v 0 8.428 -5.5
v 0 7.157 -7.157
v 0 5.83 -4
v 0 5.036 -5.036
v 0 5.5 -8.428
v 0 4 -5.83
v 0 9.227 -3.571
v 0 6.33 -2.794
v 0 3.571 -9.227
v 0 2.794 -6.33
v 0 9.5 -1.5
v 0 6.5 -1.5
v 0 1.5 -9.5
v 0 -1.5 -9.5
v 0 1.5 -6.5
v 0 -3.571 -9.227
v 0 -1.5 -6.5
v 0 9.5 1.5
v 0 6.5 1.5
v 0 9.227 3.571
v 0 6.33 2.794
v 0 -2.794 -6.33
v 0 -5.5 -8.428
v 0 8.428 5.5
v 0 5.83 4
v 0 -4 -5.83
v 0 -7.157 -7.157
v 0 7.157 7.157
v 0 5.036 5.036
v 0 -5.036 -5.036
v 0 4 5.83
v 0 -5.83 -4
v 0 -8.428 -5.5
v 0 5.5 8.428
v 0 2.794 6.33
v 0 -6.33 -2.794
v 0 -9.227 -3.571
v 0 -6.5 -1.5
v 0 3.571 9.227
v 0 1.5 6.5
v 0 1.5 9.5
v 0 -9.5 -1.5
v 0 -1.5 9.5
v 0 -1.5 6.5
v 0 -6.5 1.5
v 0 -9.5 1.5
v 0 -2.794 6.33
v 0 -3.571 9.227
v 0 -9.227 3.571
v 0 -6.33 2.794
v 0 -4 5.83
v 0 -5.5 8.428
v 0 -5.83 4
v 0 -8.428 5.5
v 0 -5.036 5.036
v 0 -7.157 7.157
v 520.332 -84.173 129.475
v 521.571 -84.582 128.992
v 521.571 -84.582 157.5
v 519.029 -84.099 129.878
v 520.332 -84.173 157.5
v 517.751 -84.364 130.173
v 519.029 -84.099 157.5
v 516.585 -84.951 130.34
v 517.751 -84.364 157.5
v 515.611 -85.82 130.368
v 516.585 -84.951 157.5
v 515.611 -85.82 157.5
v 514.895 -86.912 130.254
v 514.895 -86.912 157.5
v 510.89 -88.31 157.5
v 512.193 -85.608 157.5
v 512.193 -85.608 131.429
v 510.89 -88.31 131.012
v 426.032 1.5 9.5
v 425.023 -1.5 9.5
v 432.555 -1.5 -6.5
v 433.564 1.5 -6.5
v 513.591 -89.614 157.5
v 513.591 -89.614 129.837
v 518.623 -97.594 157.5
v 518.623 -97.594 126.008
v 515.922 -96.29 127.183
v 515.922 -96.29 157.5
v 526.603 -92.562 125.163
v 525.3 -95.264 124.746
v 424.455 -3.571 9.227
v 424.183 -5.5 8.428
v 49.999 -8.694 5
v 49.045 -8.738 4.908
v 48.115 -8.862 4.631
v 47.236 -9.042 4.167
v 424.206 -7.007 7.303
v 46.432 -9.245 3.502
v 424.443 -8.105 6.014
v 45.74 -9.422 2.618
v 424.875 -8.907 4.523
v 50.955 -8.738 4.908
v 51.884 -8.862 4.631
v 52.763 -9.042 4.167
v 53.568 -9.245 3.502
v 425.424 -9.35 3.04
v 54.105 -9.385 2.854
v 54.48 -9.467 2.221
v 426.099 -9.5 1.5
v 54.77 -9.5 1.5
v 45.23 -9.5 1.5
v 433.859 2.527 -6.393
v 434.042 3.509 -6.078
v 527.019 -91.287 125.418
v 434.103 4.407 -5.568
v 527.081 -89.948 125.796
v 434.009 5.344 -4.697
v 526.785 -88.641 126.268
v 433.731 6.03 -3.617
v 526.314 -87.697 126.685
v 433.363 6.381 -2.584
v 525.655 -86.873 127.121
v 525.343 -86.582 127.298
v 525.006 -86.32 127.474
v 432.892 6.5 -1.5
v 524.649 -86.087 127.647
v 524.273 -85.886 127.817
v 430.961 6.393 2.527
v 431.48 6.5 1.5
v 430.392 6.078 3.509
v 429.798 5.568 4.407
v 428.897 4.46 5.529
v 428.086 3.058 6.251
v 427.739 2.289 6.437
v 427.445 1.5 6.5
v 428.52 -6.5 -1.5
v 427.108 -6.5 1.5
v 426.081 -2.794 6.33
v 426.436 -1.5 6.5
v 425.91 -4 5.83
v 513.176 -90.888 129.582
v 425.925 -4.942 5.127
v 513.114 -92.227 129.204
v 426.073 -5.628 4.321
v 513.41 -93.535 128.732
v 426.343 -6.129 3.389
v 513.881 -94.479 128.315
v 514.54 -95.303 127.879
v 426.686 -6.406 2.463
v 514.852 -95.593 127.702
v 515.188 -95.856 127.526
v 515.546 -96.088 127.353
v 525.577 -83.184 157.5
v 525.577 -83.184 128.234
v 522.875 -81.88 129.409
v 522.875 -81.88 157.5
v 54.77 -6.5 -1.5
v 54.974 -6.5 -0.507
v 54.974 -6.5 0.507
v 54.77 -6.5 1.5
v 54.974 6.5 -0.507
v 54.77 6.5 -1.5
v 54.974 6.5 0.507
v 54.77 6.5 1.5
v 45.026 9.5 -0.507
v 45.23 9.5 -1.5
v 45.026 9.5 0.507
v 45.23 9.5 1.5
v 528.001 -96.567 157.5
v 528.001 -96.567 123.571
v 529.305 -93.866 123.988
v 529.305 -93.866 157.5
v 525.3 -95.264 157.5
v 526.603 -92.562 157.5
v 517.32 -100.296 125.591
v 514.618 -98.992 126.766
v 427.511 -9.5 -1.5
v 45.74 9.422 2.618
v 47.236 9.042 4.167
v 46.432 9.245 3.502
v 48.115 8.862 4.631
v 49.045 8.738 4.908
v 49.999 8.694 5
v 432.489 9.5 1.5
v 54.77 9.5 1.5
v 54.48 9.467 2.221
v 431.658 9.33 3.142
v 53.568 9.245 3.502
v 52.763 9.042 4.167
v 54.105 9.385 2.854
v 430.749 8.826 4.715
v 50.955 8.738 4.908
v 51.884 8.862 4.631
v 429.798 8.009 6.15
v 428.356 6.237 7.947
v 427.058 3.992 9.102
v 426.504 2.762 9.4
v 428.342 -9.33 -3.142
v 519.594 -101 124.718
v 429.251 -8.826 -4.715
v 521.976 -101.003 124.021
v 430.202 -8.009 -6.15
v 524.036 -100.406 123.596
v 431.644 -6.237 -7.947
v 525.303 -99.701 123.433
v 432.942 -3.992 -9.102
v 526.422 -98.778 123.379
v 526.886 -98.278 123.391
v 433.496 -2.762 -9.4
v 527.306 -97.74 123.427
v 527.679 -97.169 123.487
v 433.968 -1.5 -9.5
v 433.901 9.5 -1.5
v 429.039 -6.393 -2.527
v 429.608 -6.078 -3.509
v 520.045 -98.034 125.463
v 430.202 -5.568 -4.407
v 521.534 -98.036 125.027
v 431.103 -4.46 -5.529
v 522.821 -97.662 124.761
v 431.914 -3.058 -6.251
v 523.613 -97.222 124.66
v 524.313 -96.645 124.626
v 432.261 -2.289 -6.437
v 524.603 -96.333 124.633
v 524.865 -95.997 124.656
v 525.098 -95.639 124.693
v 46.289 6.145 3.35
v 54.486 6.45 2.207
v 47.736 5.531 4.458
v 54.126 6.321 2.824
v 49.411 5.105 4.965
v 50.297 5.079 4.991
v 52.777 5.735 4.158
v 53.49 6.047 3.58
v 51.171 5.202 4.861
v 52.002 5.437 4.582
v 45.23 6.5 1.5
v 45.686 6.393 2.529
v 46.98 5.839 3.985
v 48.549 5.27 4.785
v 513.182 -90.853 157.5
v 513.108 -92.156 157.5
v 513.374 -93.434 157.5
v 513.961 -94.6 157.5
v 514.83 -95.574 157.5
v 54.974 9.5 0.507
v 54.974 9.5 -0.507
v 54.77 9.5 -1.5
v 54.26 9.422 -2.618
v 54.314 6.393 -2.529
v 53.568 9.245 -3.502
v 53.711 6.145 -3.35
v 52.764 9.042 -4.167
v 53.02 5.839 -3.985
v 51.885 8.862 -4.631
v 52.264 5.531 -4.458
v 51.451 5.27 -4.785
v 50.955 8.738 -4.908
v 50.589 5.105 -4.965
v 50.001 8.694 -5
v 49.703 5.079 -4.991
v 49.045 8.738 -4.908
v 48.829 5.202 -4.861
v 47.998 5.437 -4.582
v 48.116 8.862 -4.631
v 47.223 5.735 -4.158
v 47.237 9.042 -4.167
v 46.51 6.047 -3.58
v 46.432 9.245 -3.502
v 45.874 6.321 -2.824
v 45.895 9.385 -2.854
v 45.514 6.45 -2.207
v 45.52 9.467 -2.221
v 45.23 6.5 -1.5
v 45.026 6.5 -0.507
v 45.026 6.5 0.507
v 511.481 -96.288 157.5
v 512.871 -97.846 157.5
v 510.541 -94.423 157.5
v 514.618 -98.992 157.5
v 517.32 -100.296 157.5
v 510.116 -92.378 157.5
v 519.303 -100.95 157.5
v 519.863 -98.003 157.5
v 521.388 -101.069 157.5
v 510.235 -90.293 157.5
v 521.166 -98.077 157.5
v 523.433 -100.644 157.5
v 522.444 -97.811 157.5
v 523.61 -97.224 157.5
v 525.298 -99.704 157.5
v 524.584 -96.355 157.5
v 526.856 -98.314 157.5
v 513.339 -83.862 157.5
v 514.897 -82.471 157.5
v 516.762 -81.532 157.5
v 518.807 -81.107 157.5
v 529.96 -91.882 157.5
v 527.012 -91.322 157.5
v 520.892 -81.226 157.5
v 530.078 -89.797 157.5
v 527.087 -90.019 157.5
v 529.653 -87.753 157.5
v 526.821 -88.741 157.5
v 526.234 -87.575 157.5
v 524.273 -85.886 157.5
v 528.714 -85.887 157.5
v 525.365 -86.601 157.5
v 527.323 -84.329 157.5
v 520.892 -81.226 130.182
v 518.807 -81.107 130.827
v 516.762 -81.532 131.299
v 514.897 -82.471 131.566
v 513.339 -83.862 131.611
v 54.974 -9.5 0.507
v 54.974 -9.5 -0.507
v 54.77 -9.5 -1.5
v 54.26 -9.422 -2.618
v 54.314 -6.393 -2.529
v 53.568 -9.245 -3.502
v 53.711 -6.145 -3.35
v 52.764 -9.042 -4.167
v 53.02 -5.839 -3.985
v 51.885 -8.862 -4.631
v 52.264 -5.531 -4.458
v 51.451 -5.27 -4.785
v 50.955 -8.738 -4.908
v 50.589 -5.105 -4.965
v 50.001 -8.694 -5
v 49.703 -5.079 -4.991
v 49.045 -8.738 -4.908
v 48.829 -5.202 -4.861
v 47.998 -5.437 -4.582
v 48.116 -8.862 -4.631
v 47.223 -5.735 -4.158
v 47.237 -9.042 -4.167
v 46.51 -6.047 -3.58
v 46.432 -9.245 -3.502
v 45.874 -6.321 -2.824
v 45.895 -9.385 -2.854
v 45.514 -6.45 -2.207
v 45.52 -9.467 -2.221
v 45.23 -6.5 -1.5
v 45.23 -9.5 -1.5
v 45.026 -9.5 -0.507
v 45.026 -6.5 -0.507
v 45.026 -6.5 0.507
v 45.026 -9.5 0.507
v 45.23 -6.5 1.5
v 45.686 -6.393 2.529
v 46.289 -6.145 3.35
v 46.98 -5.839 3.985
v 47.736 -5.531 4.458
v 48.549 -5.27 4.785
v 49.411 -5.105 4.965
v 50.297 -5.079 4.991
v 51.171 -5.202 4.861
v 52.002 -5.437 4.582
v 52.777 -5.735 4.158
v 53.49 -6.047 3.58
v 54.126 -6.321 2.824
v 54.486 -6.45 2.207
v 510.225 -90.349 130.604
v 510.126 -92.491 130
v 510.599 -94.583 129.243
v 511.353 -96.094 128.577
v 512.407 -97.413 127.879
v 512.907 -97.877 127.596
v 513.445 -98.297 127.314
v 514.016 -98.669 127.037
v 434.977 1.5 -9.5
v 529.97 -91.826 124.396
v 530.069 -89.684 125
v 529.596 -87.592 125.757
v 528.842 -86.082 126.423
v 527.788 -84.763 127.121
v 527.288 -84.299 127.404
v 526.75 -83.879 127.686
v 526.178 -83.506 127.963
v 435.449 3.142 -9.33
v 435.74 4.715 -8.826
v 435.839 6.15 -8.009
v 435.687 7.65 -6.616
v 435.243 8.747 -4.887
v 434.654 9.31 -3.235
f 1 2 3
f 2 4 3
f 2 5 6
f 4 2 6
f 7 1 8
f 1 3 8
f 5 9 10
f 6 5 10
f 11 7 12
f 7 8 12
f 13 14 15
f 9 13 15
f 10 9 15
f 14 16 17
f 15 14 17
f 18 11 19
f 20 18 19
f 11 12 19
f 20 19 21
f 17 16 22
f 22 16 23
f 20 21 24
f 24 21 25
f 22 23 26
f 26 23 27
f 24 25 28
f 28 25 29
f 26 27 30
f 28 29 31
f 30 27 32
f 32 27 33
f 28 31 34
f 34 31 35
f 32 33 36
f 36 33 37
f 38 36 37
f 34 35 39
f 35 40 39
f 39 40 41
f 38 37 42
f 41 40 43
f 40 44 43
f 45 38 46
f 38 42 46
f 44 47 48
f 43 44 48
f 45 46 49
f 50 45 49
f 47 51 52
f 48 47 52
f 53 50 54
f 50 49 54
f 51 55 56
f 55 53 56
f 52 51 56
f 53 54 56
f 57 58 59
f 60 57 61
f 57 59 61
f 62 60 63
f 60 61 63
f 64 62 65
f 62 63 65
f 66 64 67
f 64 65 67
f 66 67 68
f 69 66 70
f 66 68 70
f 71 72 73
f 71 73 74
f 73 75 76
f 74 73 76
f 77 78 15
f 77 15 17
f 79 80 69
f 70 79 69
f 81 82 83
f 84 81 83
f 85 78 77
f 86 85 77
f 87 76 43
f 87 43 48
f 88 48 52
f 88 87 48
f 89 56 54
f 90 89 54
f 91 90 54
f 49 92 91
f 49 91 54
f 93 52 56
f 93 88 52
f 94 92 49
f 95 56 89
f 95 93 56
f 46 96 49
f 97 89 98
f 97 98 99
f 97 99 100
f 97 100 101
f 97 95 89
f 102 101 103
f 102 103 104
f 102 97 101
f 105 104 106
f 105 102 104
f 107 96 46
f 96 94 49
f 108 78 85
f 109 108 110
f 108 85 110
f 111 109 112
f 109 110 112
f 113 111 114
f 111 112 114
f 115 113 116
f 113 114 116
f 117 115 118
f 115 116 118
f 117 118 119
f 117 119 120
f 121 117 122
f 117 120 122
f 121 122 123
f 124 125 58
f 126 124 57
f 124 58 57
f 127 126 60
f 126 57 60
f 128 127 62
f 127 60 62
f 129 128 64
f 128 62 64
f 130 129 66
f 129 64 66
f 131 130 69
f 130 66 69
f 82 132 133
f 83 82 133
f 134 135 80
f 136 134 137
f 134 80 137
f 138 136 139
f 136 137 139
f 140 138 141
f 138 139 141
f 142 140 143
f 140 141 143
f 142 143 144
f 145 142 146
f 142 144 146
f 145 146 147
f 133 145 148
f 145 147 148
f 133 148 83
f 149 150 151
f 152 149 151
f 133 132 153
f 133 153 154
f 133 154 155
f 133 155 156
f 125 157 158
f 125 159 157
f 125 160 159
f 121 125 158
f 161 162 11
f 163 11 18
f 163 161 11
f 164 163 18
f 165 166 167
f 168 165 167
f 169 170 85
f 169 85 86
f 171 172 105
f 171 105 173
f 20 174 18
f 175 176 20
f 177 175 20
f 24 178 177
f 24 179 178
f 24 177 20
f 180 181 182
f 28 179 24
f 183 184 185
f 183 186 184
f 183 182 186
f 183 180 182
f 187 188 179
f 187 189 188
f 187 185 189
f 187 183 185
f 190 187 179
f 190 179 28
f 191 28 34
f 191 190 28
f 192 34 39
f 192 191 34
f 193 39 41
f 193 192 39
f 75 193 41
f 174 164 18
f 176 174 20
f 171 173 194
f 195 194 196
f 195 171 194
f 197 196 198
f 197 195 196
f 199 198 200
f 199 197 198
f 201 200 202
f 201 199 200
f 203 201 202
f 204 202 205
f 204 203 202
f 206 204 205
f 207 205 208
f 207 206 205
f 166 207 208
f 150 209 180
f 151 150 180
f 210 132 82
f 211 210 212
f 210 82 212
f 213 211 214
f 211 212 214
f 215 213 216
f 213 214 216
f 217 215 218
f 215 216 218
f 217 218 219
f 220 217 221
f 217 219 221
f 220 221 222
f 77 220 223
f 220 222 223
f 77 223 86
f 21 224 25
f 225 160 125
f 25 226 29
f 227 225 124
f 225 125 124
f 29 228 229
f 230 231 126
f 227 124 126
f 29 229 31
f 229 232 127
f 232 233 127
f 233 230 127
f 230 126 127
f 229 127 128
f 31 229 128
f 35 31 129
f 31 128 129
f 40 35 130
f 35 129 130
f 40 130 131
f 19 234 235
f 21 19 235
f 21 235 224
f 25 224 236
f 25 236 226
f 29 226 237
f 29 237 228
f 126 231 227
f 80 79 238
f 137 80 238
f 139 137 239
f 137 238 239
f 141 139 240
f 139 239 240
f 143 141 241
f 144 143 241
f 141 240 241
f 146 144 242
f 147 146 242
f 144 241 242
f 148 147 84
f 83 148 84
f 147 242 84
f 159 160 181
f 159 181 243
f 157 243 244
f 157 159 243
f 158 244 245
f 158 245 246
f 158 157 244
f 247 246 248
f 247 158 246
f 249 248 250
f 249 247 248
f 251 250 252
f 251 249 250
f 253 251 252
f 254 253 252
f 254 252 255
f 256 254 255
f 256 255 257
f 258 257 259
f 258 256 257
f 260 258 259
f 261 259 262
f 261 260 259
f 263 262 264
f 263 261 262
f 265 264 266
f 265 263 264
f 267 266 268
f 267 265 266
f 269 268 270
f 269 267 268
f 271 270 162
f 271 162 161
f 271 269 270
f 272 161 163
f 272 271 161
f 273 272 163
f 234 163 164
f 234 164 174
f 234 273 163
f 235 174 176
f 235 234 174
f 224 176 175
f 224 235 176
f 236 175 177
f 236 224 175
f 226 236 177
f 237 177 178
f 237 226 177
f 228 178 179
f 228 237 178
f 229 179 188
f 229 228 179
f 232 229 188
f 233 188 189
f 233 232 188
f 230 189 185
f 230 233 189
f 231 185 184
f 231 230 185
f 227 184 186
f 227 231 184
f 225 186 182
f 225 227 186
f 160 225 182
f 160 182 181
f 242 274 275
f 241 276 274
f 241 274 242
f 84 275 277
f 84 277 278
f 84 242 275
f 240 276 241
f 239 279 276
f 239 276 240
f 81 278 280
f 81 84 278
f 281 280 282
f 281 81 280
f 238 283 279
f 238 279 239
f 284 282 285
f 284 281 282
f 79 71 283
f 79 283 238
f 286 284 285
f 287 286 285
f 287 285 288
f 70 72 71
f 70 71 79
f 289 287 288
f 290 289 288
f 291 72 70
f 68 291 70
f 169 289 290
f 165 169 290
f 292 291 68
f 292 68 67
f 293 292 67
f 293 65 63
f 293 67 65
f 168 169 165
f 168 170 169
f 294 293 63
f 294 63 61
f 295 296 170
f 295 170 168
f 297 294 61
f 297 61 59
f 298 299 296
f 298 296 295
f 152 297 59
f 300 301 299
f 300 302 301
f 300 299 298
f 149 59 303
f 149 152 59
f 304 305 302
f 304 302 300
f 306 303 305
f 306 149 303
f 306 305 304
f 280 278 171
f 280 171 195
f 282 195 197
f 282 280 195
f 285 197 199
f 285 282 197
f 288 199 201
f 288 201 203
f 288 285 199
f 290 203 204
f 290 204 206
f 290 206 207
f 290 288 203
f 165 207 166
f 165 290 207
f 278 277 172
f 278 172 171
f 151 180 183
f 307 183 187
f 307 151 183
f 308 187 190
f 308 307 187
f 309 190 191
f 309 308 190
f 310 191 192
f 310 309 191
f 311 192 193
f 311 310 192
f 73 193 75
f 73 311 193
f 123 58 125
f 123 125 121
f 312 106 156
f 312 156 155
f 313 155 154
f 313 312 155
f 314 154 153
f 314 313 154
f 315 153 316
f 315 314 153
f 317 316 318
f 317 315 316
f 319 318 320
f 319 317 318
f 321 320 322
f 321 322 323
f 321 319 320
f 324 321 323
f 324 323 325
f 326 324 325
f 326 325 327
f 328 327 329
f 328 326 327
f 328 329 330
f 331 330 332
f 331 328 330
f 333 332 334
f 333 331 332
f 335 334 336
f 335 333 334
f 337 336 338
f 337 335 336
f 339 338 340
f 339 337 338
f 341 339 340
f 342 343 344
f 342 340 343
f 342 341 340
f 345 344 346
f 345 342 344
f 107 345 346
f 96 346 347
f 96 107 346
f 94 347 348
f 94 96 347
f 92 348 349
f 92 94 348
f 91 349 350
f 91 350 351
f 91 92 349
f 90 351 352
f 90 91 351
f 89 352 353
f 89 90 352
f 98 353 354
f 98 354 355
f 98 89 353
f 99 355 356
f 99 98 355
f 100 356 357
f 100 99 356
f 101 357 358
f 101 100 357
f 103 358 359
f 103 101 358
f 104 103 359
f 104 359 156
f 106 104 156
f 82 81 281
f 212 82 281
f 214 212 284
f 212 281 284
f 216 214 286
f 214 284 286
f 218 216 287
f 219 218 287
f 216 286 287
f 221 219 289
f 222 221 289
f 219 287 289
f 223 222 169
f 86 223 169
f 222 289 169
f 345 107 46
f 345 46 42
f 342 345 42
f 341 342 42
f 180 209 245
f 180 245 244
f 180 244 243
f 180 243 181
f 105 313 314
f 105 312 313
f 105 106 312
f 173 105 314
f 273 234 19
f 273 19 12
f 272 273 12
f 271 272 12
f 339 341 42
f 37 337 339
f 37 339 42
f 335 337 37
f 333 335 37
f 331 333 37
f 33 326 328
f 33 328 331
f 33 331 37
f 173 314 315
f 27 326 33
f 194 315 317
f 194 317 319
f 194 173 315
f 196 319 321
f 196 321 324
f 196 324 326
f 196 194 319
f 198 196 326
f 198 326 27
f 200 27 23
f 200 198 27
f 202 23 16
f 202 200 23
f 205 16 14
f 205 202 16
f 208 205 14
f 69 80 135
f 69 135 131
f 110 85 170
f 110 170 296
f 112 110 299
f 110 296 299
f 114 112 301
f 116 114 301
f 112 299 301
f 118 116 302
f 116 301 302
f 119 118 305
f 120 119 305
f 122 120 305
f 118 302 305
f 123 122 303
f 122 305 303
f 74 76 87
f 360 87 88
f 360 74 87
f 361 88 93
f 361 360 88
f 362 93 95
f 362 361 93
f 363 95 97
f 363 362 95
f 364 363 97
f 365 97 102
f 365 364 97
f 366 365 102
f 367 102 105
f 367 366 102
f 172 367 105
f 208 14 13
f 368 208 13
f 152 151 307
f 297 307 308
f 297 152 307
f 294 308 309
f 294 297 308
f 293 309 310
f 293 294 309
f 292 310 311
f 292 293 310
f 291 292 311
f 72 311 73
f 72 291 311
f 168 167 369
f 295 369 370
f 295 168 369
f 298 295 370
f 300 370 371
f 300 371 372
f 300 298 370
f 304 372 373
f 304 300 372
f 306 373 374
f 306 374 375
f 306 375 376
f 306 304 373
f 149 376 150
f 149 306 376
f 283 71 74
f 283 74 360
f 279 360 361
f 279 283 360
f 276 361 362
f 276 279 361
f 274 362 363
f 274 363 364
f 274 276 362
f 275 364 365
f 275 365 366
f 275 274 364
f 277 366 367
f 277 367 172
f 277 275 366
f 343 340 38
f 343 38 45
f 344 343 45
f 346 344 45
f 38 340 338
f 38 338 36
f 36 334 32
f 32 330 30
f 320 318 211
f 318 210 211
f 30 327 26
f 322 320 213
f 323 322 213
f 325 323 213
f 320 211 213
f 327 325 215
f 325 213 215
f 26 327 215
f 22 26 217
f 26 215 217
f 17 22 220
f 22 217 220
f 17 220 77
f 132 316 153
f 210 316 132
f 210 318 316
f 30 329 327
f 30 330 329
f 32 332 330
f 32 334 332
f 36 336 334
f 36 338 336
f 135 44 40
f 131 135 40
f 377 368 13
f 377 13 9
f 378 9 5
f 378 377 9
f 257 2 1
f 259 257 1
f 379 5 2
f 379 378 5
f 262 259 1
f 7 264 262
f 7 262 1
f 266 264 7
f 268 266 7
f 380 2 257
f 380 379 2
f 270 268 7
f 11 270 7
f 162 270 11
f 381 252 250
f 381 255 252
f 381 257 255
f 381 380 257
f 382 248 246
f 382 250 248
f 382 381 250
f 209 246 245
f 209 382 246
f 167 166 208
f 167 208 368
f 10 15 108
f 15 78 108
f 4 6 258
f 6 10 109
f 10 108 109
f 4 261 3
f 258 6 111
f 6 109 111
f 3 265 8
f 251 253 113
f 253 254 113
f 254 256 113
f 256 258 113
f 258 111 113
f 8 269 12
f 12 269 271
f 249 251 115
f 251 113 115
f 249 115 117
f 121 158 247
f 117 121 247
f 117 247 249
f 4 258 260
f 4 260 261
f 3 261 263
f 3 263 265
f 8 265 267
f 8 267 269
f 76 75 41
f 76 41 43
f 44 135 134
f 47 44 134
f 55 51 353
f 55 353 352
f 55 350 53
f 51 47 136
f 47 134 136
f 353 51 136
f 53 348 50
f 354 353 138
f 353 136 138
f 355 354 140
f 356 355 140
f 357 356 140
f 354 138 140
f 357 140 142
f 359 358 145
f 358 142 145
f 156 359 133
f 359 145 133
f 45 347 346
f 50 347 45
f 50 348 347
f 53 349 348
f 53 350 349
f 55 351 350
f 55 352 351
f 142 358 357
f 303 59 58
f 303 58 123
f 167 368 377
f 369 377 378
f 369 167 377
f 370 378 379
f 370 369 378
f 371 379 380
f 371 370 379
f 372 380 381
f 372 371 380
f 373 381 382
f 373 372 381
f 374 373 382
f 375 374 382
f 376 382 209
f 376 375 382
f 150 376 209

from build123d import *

# Parameters (mm, degrees)
CUT_EXTRUDE3_DEPTH      = 563.167093213
CUT_EXTRUDE3_DEPTH_BACK = 563.167093213
SKETCH21_R              = 5


with BuildPart() as part:
    # Sweep-Thin3: sweep along a curve in space
    with BuildLine() as sweep_thin3_path:
        Line((0, 0, 0), (430, 0, 0))
        Line((430, 0, 0), (520.097414894, -91.087777242, 127.5))
        Line((520.097414894, -91.087777242, 127.5), (520.097414894, -91.087777242, 157.5))
    # Sketch2 → Sweep-Thin3 (sweep)
    with BuildSketch(Plane(origin=(0, 0, 0), x_dir=(0, 0, -1), z_dir=(1, 0, 0))):
        with BuildLine():
            Line((1.5, 9.5), (-1.5, 9.5))
            ThreePointArc((-1.5, 9.5), (-7.156854249, 7.156854249), (-9.5, 1.5))
            Line((-9.5, 1.5), (-9.5, -1.5))
            ThreePointArc((-9.5, -1.5), (-7.156854249, -7.156854249), (-1.5, -9.5))
            Line((-1.5, -9.5), (1.5, -9.5))
            ThreePointArc((1.5, -9.5), (7.156854249, -7.156854249), (9.5, -1.5))
            Line((9.5, -1.5), (9.5, 1.5))
            ThreePointArc((9.5, 1.5), (7.156854249, 7.156854249), (1.5, 9.5))
        make_face()
        with BuildLine():
            Line((1.5, 6.5), (-1.5, 6.5))
            ThreePointArc((-1.5, 6.5), (-5.035533906, 5.035533906), (-6.5, 1.5))
            Line((-6.5, 1.5), (-6.5, -1.5))
            ThreePointArc((-6.5, -1.5), (-5.035533906, -5.035533906), (-1.5, -6.5))
            Line((-1.5, -6.5), (1.5, -6.5))
            ThreePointArc((1.5, -6.5), (5.035533906, -5.035533906), (6.5, -1.5))
            Line((6.5, -1.5), (6.5, 1.5))
            ThreePointArc((6.5, 1.5), (5.035533906, 5.035533906), (1.5, 6.5))
        make_face(mode=Mode.SUBTRACT)
    sweep(path=sweep_thin3_path.line, transition=Transition.RIGHT)

    # Sketch21 → Cut-Extrude3 (cut, two sides: drawn at the far end of the back side and taken through both)
    with BuildSketch(Plane(origin=(0, 0, 0), x_dir=(1, 0, 0), z_dir=(0, 1, 0)).offset(-CUT_EXTRUDE3_DEPTH_BACK)):
        with Locations(Location((50, 0, 0), (0, 0, 342.542396876))):
            Circle(SKETCH21_R)
    extrude(amount=CUT_EXTRUDE3_DEPTH + CUT_EXTRUDE3_DEPTH_BACK, mode=Mode.SUBTRACT)


solid = part.part
